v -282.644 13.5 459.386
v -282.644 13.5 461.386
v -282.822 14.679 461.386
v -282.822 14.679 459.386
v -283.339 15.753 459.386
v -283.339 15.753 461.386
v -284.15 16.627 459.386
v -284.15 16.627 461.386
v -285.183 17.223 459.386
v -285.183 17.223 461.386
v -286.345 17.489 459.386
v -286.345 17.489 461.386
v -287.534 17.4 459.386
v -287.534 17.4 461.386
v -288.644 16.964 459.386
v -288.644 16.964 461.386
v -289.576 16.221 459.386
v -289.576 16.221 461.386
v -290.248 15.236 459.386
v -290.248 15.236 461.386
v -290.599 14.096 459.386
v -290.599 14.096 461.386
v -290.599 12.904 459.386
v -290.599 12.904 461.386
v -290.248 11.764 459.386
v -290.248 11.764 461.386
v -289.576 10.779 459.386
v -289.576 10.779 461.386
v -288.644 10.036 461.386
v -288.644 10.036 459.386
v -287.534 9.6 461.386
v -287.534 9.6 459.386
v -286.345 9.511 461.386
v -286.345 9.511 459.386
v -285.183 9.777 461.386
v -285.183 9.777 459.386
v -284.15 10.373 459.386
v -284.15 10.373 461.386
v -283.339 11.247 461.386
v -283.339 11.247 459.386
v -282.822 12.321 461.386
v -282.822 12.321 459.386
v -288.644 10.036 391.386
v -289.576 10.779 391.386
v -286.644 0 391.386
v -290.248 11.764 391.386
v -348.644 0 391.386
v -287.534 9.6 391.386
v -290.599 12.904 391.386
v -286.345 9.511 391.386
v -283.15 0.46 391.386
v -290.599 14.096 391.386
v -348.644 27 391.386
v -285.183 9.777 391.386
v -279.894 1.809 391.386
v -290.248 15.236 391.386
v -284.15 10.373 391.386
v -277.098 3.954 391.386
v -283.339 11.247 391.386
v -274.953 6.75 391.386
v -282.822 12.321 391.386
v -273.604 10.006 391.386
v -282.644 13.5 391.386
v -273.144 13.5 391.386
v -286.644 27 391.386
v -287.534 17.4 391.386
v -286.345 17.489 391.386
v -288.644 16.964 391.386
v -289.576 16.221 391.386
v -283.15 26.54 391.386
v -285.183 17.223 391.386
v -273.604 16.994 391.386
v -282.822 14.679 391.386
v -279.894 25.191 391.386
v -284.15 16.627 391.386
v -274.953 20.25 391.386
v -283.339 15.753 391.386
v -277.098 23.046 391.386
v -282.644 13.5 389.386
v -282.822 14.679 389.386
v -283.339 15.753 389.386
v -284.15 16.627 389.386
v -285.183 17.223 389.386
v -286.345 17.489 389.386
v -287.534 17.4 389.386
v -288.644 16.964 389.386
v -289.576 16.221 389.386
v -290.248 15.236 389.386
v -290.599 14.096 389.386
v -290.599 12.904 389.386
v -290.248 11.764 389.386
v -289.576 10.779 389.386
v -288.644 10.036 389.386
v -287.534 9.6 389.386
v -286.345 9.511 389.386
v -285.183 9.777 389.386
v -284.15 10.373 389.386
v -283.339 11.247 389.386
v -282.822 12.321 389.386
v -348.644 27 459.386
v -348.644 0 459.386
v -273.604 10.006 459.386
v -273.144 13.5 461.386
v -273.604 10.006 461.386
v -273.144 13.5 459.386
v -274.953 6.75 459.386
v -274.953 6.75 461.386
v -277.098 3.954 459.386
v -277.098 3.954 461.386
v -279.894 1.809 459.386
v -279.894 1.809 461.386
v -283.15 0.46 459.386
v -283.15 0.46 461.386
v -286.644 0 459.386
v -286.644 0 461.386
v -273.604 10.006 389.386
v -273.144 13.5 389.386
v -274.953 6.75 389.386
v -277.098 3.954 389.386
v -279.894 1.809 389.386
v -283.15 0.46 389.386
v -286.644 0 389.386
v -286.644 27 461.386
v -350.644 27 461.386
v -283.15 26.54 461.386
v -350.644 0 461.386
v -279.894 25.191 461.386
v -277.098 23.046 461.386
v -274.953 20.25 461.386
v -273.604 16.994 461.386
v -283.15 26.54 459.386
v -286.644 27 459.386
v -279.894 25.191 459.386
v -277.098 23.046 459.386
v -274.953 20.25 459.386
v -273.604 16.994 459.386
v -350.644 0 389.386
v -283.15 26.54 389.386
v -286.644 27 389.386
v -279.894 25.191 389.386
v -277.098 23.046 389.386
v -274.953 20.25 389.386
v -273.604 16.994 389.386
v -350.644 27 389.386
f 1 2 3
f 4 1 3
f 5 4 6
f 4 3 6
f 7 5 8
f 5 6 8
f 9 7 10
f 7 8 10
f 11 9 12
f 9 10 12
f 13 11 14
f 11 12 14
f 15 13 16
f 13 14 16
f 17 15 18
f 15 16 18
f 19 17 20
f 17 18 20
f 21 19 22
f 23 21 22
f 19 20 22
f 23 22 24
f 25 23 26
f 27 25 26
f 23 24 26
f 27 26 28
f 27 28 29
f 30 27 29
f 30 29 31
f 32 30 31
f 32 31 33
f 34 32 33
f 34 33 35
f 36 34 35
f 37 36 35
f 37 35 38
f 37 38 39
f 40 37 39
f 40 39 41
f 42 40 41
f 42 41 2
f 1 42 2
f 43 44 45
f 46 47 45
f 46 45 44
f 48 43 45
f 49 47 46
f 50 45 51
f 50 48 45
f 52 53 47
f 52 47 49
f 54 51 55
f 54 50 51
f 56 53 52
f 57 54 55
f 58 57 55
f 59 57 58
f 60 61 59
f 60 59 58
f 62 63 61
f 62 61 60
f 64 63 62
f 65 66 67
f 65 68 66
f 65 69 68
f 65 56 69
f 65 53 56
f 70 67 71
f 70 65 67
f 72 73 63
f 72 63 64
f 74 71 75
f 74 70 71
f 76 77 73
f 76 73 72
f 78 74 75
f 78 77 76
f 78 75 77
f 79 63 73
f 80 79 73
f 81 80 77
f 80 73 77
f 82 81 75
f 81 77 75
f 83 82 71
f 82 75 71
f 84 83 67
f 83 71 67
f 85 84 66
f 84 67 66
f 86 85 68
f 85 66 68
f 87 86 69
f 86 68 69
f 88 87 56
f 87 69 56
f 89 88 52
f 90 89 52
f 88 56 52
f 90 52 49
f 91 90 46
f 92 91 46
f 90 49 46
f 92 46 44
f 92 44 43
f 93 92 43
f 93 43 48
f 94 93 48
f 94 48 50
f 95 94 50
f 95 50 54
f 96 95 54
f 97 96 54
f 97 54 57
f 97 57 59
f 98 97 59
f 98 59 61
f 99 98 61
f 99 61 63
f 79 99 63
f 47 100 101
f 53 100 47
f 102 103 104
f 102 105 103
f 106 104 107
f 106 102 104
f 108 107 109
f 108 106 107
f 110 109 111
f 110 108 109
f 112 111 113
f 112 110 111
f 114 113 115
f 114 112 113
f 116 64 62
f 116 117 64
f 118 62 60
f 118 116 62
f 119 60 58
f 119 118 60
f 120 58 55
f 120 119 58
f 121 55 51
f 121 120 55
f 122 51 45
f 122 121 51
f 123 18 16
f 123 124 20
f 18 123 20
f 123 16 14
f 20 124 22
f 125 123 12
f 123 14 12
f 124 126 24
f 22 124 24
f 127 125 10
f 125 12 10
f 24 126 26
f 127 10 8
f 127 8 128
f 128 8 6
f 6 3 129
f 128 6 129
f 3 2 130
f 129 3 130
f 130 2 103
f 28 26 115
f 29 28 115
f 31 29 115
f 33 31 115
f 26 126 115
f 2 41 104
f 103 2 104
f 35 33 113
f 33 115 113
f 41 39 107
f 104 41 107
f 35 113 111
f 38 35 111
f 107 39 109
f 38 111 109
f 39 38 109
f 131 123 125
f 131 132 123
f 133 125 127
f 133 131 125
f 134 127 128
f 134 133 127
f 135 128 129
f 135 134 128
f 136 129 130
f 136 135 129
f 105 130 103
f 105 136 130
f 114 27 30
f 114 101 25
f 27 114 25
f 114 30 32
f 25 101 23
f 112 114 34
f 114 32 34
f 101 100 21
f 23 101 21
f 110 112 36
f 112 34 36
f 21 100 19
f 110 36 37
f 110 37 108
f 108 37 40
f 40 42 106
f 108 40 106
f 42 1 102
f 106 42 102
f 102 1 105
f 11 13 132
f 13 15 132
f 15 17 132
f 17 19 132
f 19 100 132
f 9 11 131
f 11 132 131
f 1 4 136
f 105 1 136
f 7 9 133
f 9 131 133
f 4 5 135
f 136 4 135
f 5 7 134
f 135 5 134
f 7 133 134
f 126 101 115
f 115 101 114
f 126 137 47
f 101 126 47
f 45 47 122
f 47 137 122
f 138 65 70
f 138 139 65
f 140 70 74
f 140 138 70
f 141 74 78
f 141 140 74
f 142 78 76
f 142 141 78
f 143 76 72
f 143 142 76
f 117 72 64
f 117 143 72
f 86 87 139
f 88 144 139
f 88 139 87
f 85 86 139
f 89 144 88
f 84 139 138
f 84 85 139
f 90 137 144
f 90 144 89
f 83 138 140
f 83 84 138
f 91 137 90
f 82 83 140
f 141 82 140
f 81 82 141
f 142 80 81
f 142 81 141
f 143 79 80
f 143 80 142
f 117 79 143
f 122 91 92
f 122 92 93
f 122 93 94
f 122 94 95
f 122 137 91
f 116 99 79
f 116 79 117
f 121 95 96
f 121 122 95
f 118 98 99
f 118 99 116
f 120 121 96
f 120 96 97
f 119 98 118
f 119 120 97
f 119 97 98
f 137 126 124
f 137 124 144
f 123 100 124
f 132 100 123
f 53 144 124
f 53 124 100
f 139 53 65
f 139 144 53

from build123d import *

# Parameters (mm, degrees)
SKETCH1_W           = 77.5
SKETCH1_H           = 72
BOSS_EXTRUDE2_DEPTH = 27
SKETCH2_W           = 73.5
SKETCH2_H           = 68
CUT_EXTRUDE1_DEPTH  = 27
SKETCH7_W           = 2
SKETCH7_H           = 68
CUT_EXTRUDE2_DEPTH  = 27
FILLET6_R           = 13.5
FILLET7_R           = 13.5
SKETCH9_R           = 4
CUT_EXTRUDE3_DEPTH  = 94


with BuildPart() as part:
    # Sketch1 → Boss-Extrude2 (new body)
    with BuildSketch(Plane(origin=(0, 0, 0), x_dir=(1, 0, 0), z_dir=(0, 1, 0))):
        with Locations((-311.893899893, -425.385906876)):
            Rectangle(SKETCH1_W, SKETCH1_H)
    extrude(amount=BOSS_EXTRUDE2_DEPTH)

    # Sketch2 → Cut-Extrude1 (cut)
    with BuildSketch(Plane(origin=(0, 27, 0), x_dir=(1, 0, 0), z_dir=(0, 1, 0))):
        with Locations((-311.893899893, -425.385906876)):
            Rectangle(SKETCH2_W, SKETCH2_H)
    extrude(amount=-CUT_EXTRUDE1_DEPTH, mode=Mode.SUBTRACT)

    # Sketch7 → Cut-Extrude2 (cut)
    with BuildSketch(Plane(origin=(0, 27, 0), x_dir=(1, 0, 0), z_dir=(0, 1, 0))):
        with Locations((-274.143899893, -425.385906876)):
            Rectangle(SKETCH7_W, SKETCH7_H)
    extrude(amount=-CUT_EXTRUDE2_DEPTH, mode=Mode.SUBTRACT)

    # Fillet6
    fillet6_edges = [part.edges().sort_by_distance(p)[0] for p in [
        (-273.143899893, 0, 460.385906876),
        (-273.143899893, 27, 460.385906876),
    ]]
    fillet(fillet6_edges, radius=FILLET6_R - 0.0001)  # a hair under: the kernel refuses the full size

    # Fillet7
    fillet7_edges = [part.edges().sort_by_distance(p)[0] for p in [
        (-273.143899893, 0, 390.385906876),
        (-273.143899893, 27, 390.385906876),
    ]]
    fillet(fillet7_edges, radius=FILLET7_R - 0.0001)  # a hair under: the kernel refuses the full size

    # Sketch9 → Cut-Extrude3 (cut)
    with BuildSketch(Plane.XY.offset(461.385906876)):
        with Locations((-286.643899893, 13.5)):
            Circle(SKETCH9_R)
    extrude(amount=-CUT_EXTRUDE3_DEPTH, mode=Mode.SUBTRACT)


solid = part.part
